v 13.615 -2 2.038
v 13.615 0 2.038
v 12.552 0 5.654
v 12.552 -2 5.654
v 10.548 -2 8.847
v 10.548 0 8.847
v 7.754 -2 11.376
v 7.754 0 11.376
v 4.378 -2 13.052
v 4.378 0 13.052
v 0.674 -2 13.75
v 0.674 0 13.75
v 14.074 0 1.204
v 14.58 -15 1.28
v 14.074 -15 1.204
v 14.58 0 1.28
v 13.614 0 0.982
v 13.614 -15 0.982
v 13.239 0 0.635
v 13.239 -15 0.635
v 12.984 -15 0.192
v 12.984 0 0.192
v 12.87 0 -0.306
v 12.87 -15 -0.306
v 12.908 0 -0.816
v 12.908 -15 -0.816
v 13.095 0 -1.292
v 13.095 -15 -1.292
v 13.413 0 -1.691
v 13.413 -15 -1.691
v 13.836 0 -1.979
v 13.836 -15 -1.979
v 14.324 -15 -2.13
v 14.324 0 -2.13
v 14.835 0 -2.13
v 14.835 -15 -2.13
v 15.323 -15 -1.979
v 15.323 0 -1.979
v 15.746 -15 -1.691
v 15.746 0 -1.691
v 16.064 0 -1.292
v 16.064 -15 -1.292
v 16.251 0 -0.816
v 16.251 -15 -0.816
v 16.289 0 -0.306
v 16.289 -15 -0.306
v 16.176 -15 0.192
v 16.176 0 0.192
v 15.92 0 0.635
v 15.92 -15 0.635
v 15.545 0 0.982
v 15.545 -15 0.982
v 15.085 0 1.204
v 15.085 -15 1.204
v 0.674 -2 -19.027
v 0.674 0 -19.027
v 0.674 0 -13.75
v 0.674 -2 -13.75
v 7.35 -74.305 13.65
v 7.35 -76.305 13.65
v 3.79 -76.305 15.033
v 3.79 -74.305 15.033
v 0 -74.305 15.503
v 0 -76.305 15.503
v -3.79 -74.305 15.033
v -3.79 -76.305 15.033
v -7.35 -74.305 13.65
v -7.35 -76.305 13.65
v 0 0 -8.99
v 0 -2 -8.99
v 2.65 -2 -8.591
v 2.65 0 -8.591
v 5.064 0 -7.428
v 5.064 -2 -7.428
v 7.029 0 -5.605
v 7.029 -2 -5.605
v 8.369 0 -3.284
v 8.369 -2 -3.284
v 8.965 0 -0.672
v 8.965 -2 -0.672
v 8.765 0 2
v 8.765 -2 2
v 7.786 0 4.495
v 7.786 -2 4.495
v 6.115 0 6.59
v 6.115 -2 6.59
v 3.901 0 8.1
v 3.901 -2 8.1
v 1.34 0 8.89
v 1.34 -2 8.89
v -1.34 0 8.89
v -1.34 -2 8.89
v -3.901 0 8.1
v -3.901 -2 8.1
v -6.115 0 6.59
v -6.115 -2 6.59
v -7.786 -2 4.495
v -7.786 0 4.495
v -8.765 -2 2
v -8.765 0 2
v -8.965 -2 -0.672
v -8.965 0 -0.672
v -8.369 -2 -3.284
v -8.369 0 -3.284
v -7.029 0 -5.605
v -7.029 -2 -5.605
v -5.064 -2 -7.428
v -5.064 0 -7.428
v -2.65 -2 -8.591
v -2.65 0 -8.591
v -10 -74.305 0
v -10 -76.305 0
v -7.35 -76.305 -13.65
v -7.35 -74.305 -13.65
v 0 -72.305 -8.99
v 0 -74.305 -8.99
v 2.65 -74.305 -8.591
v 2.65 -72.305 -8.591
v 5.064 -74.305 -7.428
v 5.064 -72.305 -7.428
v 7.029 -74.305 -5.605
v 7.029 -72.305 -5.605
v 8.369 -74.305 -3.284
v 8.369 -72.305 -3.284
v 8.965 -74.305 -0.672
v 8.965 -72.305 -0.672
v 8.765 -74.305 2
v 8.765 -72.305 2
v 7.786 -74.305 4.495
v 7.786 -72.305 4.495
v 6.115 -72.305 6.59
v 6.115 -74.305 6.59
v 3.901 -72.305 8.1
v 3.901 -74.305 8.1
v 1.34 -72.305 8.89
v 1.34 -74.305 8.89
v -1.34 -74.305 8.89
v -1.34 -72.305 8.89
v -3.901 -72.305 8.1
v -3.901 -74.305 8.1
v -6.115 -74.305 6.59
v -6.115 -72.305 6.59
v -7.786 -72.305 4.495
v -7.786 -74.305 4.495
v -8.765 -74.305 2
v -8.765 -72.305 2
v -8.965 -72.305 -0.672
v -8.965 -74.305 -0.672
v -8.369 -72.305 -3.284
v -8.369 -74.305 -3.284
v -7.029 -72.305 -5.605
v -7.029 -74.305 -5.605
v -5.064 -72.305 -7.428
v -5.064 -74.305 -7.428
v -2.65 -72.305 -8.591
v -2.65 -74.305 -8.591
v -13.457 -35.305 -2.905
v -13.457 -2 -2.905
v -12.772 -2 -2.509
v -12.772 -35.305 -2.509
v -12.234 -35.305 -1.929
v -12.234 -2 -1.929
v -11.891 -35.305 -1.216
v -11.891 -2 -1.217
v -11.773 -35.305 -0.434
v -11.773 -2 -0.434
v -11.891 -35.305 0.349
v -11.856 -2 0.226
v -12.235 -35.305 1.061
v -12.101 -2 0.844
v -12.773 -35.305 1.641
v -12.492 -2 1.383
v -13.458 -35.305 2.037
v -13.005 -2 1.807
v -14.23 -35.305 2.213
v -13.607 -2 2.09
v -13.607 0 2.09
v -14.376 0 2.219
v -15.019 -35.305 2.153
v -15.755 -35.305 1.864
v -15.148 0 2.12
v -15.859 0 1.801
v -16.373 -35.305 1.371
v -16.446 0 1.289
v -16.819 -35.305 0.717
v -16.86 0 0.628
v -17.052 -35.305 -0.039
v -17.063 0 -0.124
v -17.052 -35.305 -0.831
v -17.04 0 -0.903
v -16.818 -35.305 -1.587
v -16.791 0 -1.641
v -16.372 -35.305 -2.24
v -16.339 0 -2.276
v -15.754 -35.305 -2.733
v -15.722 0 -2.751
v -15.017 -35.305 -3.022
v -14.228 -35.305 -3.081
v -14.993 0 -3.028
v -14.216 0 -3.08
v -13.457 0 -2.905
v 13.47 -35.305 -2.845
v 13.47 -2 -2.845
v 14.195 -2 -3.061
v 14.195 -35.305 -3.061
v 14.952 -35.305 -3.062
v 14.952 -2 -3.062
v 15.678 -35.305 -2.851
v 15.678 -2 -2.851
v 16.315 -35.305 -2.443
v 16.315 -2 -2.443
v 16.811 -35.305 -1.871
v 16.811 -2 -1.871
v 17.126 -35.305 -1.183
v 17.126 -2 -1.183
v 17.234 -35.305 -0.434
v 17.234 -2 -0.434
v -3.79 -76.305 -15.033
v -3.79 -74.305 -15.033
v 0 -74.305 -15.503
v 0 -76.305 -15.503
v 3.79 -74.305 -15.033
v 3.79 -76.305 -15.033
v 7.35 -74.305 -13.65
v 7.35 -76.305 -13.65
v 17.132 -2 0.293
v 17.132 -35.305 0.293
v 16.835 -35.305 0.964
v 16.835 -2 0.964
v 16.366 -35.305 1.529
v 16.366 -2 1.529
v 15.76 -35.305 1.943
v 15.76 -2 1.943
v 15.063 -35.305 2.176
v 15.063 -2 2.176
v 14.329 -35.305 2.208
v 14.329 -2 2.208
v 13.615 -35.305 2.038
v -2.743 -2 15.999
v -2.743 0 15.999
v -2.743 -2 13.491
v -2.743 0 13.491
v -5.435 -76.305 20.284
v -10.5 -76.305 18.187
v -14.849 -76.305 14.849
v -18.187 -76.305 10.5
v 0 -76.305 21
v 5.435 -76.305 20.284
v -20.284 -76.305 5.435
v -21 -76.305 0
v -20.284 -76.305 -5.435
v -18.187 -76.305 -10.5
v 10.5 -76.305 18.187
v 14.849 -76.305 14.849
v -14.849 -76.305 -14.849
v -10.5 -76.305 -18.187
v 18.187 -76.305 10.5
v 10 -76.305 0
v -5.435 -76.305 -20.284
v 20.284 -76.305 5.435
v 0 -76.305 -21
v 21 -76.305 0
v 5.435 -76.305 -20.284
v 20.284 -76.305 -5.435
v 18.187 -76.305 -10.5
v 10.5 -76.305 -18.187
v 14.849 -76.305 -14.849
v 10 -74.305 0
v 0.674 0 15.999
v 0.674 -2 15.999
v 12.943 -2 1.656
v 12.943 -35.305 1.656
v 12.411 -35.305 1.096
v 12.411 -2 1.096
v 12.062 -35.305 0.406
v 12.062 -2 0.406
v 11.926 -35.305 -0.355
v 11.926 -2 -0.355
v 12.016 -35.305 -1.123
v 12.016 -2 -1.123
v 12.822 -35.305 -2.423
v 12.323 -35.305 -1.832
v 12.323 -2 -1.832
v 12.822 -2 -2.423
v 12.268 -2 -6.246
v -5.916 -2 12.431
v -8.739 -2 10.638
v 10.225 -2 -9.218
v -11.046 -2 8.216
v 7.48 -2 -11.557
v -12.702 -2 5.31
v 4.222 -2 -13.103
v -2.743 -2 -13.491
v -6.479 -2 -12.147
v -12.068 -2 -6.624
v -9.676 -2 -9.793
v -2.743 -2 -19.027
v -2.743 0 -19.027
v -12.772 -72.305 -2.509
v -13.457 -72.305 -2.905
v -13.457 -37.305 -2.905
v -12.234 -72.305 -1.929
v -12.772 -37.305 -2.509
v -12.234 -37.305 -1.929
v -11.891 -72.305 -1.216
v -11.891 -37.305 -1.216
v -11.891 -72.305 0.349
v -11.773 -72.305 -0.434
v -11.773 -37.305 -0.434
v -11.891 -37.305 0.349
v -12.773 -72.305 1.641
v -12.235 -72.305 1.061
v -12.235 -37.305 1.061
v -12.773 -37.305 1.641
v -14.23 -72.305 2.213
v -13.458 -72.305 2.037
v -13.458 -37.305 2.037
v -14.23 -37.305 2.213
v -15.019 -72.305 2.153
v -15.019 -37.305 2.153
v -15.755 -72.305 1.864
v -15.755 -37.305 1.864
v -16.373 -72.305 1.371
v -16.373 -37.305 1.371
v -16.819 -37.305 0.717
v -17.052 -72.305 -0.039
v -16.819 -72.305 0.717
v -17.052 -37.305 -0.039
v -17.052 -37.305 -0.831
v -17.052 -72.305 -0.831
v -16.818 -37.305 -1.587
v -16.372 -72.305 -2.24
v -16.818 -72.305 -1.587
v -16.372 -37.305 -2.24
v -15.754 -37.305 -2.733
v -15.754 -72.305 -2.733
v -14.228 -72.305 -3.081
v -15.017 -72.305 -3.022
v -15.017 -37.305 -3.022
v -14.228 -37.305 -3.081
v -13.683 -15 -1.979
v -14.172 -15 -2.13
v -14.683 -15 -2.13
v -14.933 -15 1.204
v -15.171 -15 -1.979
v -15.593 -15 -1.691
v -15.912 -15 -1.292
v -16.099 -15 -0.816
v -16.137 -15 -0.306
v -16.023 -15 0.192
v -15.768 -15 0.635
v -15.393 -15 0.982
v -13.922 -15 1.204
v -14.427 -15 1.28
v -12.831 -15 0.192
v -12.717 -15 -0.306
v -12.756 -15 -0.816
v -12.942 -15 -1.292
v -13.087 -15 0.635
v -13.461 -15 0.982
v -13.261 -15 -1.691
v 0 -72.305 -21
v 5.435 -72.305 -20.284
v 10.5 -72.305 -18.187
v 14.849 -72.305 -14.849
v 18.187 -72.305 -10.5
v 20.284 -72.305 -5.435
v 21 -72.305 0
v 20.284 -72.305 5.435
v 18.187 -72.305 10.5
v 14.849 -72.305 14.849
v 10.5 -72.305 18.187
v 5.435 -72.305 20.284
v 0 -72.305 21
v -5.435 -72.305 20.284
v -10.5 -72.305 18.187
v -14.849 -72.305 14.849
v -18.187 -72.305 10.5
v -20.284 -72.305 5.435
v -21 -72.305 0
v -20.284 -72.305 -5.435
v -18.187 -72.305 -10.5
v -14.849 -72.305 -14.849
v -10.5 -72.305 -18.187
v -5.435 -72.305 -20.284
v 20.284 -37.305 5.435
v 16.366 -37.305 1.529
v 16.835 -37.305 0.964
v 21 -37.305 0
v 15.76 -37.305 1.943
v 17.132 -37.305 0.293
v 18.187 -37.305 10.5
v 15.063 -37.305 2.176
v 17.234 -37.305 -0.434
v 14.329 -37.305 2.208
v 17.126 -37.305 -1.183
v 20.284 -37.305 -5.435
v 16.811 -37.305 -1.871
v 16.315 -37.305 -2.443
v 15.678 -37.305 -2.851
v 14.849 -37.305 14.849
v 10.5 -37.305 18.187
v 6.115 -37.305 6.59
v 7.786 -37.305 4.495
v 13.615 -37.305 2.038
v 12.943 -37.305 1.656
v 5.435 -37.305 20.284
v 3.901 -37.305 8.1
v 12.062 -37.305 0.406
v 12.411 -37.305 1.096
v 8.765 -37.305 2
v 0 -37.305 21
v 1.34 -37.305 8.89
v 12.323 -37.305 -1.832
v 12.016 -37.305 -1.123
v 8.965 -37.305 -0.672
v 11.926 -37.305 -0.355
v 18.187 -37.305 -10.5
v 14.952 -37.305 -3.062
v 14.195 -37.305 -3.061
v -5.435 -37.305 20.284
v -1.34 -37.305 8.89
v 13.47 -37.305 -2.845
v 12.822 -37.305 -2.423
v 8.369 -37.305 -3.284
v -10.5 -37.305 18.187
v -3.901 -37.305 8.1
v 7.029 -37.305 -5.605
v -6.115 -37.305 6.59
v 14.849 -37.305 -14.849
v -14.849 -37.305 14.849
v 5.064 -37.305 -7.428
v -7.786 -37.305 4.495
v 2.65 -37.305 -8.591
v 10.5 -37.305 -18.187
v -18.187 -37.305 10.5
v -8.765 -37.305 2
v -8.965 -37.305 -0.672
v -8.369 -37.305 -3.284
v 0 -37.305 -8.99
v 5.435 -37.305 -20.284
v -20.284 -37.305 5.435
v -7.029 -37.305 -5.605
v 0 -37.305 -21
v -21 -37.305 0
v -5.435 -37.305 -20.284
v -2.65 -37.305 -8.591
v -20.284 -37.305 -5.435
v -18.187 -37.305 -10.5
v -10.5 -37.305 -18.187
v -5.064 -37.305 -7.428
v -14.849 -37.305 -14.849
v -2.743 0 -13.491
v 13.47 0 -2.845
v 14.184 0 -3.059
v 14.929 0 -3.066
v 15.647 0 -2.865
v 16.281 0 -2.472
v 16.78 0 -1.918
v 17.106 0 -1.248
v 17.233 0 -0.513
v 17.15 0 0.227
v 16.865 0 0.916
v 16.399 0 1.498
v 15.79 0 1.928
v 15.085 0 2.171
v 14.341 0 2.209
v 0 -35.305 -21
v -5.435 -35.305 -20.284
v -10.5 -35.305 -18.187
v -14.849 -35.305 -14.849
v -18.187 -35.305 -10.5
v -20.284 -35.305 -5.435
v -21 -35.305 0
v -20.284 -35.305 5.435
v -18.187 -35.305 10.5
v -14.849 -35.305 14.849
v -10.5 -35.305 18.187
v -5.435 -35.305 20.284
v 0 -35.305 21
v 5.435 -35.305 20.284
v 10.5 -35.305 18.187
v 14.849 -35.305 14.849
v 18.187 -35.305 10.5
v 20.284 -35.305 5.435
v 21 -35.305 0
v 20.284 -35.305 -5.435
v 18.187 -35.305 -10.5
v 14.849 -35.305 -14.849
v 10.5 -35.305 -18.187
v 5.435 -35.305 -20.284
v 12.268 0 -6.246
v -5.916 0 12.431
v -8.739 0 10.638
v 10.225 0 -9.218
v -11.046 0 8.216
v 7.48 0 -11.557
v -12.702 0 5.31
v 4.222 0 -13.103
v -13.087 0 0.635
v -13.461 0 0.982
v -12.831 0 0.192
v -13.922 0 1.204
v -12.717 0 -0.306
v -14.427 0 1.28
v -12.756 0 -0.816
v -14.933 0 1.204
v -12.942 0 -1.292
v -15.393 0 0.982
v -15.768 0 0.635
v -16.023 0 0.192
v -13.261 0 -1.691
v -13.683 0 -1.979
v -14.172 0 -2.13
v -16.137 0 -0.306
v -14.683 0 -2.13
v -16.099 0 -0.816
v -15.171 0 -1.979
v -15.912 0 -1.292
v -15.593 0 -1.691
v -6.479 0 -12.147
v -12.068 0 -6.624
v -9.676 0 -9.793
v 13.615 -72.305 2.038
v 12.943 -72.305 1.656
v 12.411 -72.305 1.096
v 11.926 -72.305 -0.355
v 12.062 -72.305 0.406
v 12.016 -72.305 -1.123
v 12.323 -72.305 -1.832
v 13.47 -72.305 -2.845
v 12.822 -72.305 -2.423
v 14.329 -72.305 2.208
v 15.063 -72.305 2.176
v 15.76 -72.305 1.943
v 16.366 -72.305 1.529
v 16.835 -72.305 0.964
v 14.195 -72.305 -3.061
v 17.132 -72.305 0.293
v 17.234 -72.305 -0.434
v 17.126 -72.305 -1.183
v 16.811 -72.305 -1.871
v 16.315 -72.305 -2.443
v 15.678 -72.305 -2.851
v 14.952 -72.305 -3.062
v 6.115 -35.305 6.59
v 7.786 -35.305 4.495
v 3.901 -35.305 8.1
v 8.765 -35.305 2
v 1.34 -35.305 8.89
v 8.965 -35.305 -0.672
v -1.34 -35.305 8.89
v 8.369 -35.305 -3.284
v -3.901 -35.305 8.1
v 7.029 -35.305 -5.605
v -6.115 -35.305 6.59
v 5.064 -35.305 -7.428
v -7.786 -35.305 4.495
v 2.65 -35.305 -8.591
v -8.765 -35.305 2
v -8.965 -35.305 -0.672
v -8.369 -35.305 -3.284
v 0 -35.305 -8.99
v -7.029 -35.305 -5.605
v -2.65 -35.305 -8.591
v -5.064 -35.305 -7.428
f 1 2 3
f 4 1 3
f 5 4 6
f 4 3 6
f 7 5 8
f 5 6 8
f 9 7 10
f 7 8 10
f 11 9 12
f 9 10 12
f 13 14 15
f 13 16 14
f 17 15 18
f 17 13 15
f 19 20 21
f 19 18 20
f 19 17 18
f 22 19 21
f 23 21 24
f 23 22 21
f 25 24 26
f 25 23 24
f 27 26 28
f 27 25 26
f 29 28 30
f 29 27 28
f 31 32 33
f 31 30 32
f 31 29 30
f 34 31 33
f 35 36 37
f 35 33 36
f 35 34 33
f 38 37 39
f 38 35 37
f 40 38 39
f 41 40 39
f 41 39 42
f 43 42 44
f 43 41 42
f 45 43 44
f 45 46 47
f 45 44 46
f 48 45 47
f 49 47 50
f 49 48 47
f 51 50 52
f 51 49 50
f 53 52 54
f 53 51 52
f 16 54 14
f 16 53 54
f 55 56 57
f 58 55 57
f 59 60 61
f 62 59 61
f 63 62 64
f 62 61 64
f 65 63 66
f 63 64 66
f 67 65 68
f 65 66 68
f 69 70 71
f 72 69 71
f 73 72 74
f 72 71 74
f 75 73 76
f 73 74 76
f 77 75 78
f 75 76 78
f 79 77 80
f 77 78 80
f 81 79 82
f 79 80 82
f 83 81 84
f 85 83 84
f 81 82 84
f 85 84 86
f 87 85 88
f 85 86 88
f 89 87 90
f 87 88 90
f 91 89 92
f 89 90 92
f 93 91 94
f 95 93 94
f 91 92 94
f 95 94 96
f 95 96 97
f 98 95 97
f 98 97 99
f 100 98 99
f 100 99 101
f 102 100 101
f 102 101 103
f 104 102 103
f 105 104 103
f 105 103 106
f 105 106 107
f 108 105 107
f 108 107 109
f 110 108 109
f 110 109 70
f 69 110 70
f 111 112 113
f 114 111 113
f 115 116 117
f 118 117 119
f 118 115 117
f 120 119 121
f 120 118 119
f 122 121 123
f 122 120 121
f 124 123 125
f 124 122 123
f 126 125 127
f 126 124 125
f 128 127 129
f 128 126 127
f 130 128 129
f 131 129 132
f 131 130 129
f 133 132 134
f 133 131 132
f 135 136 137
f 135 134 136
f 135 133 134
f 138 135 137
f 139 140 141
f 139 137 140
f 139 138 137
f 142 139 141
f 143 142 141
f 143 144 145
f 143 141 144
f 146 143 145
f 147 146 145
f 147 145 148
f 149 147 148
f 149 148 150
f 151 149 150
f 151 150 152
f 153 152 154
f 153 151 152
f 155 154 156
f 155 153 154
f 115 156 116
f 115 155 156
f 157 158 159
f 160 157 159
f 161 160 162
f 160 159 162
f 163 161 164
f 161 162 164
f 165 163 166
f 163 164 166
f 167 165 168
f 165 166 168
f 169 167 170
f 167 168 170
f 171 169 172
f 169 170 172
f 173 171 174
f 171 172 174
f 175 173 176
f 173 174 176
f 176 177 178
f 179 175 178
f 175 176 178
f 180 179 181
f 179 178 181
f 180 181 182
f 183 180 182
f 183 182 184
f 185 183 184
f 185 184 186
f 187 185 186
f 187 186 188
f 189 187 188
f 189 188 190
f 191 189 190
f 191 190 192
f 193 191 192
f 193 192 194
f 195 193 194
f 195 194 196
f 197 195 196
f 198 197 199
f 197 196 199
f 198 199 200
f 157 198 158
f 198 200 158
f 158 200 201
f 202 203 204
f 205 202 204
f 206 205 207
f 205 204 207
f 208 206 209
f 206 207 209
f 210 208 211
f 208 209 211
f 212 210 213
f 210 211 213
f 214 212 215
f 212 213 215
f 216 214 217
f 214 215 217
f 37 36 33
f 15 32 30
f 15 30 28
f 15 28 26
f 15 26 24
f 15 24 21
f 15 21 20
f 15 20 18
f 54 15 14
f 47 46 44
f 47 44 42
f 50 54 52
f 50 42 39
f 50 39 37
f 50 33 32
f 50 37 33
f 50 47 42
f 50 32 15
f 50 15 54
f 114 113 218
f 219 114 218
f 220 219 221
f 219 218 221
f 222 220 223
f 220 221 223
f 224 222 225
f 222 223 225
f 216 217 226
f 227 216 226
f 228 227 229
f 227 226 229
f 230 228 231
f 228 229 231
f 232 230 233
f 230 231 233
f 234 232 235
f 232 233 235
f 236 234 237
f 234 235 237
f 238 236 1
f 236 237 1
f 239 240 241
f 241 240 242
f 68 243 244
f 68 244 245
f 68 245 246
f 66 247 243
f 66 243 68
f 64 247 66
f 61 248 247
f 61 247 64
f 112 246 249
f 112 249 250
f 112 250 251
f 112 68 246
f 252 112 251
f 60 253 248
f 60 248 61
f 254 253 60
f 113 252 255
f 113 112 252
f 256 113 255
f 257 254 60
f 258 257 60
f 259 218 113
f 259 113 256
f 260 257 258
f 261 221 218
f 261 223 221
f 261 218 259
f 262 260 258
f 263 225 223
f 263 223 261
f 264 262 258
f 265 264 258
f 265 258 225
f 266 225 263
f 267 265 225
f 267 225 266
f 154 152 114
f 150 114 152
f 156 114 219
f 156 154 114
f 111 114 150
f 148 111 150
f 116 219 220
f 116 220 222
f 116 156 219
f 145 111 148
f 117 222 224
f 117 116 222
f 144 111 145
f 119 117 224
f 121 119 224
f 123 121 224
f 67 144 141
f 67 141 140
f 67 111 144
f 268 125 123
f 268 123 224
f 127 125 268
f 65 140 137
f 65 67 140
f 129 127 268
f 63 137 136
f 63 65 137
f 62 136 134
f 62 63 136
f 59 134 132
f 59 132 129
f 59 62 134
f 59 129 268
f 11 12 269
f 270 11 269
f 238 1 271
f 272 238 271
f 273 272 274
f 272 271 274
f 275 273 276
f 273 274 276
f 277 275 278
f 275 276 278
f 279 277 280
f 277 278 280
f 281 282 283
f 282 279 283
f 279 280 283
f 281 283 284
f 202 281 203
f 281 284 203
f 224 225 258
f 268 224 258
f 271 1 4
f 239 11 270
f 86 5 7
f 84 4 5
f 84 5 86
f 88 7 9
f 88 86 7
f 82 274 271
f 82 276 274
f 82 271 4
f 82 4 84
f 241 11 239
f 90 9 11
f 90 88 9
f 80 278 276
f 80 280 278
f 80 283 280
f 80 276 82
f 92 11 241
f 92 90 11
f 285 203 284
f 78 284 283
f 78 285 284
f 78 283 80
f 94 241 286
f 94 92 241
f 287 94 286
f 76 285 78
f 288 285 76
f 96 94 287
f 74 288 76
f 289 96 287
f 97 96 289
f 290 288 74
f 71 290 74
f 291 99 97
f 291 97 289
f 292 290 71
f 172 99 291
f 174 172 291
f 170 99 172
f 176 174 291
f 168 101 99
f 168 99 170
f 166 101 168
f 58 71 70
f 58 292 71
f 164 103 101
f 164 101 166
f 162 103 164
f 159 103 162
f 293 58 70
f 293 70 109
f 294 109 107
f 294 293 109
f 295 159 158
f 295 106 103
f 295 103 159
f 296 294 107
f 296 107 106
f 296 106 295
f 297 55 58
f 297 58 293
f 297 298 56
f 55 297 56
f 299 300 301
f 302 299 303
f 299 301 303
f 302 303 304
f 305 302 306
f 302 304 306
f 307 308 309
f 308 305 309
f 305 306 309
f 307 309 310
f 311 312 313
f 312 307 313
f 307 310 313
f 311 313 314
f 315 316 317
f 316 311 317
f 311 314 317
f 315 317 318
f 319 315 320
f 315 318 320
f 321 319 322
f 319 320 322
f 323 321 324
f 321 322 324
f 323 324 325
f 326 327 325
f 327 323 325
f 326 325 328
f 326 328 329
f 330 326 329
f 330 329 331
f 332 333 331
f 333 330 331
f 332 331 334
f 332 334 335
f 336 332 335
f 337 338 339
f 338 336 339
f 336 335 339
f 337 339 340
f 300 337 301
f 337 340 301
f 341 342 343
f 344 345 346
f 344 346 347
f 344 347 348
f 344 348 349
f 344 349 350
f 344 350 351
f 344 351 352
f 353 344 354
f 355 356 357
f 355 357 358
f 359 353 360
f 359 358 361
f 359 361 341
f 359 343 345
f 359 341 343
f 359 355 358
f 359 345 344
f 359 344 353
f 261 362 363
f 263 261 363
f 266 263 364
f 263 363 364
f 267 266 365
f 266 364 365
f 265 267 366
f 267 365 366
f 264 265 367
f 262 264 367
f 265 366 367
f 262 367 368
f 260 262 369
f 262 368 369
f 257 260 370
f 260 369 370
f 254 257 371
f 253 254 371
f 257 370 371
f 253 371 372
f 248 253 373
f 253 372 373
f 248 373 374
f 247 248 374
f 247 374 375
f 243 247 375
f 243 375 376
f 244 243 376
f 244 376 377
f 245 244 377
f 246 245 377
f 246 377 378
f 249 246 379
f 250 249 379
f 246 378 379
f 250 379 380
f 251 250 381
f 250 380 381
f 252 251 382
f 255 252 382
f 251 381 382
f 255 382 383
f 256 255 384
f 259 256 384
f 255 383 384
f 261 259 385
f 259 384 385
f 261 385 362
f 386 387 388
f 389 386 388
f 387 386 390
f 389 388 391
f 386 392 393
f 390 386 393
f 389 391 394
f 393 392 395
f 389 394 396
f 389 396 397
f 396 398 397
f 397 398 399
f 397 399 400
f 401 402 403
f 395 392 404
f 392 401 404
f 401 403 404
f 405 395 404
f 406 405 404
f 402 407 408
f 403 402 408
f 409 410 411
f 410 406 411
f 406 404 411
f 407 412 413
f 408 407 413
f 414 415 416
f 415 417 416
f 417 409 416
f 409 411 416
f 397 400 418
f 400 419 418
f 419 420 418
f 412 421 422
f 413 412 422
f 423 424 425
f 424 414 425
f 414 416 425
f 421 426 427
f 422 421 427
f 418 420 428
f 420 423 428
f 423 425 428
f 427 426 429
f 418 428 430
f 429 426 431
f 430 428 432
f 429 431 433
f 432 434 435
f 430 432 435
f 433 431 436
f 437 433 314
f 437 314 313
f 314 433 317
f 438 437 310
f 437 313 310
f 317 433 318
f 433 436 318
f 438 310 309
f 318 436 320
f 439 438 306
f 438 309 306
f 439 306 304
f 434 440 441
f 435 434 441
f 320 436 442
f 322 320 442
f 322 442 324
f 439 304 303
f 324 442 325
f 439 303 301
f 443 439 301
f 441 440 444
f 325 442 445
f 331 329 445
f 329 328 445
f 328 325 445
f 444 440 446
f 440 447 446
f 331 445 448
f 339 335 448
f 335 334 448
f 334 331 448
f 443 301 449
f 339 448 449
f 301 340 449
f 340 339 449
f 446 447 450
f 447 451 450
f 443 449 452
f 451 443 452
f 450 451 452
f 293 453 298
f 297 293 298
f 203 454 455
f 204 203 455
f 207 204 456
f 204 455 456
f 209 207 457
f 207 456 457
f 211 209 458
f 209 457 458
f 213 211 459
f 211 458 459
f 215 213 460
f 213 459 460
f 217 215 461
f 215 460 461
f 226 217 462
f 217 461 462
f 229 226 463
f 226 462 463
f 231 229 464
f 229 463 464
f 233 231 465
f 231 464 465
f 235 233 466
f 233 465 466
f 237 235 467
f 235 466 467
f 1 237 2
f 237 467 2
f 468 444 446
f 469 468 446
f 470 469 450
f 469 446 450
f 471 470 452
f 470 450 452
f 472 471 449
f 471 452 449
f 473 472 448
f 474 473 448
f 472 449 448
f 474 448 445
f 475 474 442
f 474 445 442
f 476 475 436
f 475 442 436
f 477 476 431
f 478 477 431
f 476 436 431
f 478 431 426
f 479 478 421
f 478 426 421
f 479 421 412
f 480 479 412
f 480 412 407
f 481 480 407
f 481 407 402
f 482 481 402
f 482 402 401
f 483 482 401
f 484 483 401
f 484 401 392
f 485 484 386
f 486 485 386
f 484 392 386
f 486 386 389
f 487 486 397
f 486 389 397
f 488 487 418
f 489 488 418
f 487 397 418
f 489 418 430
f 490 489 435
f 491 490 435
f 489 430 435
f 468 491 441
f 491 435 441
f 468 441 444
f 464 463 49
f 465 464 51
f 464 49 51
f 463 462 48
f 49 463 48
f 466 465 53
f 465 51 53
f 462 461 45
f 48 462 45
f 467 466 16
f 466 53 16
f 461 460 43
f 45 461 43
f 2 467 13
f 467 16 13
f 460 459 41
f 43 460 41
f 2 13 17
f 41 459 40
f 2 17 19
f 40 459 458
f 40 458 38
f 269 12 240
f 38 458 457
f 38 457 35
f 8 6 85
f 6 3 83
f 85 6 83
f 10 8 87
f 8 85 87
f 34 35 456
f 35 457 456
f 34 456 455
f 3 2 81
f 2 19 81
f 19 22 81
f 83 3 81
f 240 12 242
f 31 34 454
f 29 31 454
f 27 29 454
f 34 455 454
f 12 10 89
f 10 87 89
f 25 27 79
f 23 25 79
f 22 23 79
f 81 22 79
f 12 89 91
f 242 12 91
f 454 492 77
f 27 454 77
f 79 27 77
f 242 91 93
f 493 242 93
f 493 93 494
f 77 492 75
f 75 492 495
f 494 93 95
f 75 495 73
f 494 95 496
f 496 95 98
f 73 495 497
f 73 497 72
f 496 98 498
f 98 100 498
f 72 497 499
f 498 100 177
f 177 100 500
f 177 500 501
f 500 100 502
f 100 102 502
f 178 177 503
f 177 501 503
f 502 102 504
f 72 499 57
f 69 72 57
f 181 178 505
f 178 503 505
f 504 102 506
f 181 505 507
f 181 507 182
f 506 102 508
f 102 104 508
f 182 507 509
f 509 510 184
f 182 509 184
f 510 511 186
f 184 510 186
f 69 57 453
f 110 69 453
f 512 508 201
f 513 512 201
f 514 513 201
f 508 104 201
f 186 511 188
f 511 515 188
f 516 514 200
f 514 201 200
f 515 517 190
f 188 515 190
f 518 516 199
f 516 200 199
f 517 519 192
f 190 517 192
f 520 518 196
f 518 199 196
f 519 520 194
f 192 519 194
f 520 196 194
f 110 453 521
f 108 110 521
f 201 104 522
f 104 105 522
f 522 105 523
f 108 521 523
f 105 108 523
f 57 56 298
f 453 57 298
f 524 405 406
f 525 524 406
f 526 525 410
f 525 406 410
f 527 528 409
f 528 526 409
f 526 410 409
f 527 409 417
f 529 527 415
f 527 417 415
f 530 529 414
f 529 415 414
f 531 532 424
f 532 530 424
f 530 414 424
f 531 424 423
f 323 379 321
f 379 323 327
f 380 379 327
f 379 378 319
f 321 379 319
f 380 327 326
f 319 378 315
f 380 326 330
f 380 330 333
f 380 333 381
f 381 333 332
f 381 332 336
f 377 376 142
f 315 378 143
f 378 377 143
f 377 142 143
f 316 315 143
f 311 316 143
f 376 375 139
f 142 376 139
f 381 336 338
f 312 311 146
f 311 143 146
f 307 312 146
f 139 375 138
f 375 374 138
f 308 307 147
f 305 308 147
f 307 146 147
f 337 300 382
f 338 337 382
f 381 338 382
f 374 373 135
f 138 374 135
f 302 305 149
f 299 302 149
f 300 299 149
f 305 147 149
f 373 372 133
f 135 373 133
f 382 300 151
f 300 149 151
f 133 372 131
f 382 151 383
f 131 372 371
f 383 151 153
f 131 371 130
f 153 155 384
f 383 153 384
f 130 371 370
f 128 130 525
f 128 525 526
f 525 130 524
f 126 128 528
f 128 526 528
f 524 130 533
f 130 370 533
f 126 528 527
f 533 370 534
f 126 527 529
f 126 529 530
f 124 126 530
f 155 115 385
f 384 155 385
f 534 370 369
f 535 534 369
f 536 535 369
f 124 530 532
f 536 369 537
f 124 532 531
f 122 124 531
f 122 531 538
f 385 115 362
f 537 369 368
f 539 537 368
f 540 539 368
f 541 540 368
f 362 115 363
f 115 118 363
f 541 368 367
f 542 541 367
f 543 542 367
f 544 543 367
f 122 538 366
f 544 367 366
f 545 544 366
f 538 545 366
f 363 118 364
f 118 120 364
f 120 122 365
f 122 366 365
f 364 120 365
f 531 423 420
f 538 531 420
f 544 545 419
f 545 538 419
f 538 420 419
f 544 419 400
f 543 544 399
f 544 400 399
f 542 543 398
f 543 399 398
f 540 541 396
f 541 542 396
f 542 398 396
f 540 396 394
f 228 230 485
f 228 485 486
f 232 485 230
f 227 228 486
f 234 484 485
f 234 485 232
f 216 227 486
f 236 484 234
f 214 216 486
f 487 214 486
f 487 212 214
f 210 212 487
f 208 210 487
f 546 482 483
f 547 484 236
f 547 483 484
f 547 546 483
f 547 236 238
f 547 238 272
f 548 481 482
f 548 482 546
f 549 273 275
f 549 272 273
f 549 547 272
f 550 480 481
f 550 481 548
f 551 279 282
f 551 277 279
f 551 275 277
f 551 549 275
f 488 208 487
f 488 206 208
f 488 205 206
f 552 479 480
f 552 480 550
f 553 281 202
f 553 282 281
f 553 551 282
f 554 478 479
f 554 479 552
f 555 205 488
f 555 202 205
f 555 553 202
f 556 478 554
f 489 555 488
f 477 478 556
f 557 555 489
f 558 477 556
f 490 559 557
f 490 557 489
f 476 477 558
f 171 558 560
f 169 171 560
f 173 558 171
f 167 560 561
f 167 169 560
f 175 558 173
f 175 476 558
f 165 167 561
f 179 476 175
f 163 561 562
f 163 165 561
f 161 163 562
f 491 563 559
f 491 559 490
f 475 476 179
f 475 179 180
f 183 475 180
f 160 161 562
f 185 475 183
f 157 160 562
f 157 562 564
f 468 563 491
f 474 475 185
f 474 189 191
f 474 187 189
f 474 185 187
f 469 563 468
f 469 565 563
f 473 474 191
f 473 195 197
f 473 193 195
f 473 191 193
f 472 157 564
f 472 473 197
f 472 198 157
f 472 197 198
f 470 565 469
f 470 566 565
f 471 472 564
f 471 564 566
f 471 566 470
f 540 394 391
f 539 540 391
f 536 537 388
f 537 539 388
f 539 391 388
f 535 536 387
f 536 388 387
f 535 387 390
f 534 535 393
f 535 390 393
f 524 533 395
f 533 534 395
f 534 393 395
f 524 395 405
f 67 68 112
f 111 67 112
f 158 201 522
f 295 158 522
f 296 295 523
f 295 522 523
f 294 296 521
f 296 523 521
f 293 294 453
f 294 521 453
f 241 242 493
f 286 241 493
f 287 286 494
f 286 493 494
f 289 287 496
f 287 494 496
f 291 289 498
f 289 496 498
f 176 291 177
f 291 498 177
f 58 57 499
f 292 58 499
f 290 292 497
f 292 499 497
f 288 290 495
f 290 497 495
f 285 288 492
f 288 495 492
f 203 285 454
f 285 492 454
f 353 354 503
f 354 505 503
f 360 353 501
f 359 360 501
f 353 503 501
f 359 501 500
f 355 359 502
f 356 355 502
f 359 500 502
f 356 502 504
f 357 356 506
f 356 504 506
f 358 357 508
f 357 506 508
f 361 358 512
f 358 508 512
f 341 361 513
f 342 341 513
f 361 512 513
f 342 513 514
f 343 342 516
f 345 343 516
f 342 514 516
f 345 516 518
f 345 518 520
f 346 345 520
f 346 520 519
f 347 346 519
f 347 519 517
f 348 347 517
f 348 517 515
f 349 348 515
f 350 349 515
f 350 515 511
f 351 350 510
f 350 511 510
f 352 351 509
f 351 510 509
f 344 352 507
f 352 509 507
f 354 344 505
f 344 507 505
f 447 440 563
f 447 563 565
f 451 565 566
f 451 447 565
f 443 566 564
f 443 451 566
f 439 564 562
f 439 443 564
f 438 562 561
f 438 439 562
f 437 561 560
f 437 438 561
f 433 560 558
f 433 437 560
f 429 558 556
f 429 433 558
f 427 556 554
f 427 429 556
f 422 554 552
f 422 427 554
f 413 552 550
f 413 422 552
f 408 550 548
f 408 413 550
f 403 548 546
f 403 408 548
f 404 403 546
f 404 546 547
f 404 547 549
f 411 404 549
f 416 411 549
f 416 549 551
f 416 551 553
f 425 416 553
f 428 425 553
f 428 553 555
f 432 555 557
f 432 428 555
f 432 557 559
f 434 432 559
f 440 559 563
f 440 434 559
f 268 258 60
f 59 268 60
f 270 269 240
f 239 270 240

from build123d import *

# Parameters (mm, degrees)
BOSS_EXTRUDE1_DEPTH      = 2
CUT_EXTRUDE1_REACH       = 27.75
SKETCH2_R                = 1.7145
SKETCH3_R                = 1.7145
BOSS_EXTRUDE2_DEPTH      = 72.305
CUT_EXTRUDE2_REACH       = 78.727
SKETCH4_R                = 8.99
BOSS_EXTRUDE3_DEPTH      = 2
BOSS_EXTRUDE3_DEPTH_BACK = 2
SKETCH5_R                = 21
SKETCH5_R_2              = 8.99
CUT_EXTRUDE3_DEPTH       = 2
SKETCH7_R                = 21
SKETCH7_R_2              = 8.99
BOSS_EXTRUDE4_DEPTH      = 2
SKETCH8_R                = 1.7145
BOSS_EXTRUDE5_DEPTH      = 57.305


with BuildPart() as part:
    # Sketch1 → Boss-Extrude1 (new body)
    with BuildSketch(Plane(origin=(0, 0, 0), x_dir=(1, 0, 0), z_dir=(0, 1, 0))):
        with BuildLine():
            Line((-2.743211684, 13.490721697), (-2.743211684, 19.02714))
            Line((-2.743211684, 19.02714), (0.674160958, 19.02714))
            Line((0.674160958, 19.02714), (0.674160958, 13.750283242))
            ThreePointArc((0.674160958, 13.750283242), (8.929745908, 10.47780608), (13.469544487, 2.845374062))
            ThreePointArc((13.469544487, 2.845374062), (17.232722938, 0.513379028), (13.615039655, -2.03849882))
            ThreePointArc((13.615039655, -2.03849882), (9.237791247, -10.207252084), (0.674160958, -13.750283242))
            Line((0.674160958, -13.750283242), (0.674160958, -15.99946))
            Line((0.674160958, -15.99946), (-2.743211684, -15.99946))
            Line((-2.743211684, -15.99946), (-2.743211684, -13.490721697))
            ThreePointArc((-2.743211684, -13.490721697), (-9.966316815, -9.49722651), (-13.607209812, -2.090125207))
            ThreePointArc((-13.607209812, -2.090125207), (-17.080297956, 0.514213195), (-13.456831252, 2.904905316))
            ThreePointArc((-13.456831252, 2.904905316), (-9.676012861, 9.792831937), (-2.743211684, 13.490721697))
        make_face()
    extrude(amount=-BOSS_EXTRUDE1_DEPTH)

    # Sketch2 → Cut-Extrude1 (cut, up to next)
    with BuildSketch(Plane(origin=(0, 0, 0), x_dir=(1, 0, 0), z_dir=(0, 1, 0)), mode=Mode.PRIVATE) as cut_extrude1_sk1:
        with Locations(Location((14.5796, 0.43434, 0), (0, 0, 270))):
            Circle(SKETCH2_R)
    cut_extrude1_tool1 = extrude(cut_extrude1_sk1.sketch, amount=-CUT_EXTRUDE1_REACH, mode=Mode.PRIVATE) & part.part
    # Sketch2 → Cut-Extrude1 (cut, up to next)
    with BuildSketch(Plane(origin=(0, 0, 0), x_dir=(1, 0, 0), z_dir=(0, 1, 0)), mode=Mode.PRIVATE) as cut_extrude1_sk2:
        with Locations(Location((-14.4272, 0.43434, 0), (0, 0, 270))):
            Circle(SKETCH2_R)
    cut_extrude1_tool2 = extrude(cut_extrude1_sk2.sketch, amount=-CUT_EXTRUDE1_REACH, mode=Mode.PRIVATE) & part.part
    add(cut_extrude1_tool1.solids().sort_by_distance((14.5796, 0, -0.43434))[0], mode=Mode.SUBTRACT)
    add(cut_extrude1_tool2.solids().sort_by_distance((-14.4272, 0, -0.43434))[0], mode=Mode.SUBTRACT)

    # Sketch3 → Boss-Extrude2 (add)
    # profile 1 of 2: a face of its own
    with BuildSketch(Plane.XZ.offset(2)):
        with BuildLine():
            ThreePointArc((13.469544487, -2.845374062), (16.011187954, -2.669483042), (17.2339, -0.43434))
            ThreePointArc((17.2339, -0.43434), (16.077110595, 1.757182418), (13.615039655, 2.03849882))
            ThreePointArc((13.615039655, 2.03849882), (11.926477062, -0.355300972), (13.469544487, -2.845374062))
        make_face()
        with Locations(Location((14.5796, -0.43434, 0), (0, 0, 90))):
            Circle(SKETCH3_R, mode=Mode.SUBTRACT)
    # profile 2 of 2: a face of its own
    with BuildSketch(Plane.XZ.offset(2)):
        with BuildLine():
            ThreePointArc((-13.456831252, -2.904905316), (-12.233919551, -1.929274567), (-11.7729, -0.43434))
            ThreePointArc((-11.7729, -0.43434), (-12.279898386, 1.125917756), (-13.607209812, 2.090125207))
            ThreePointArc((-13.607209812, 2.090125207), (-17.080297956, -0.514213195), (-13.456831252, -2.904905316))
        make_face()
        with Locations(Location((-14.4272, -0.43434, 0), (0, 0, 90))):
            Circle(SKETCH3_R, mode=Mode.SUBTRACT)
    extrude(amount=BOSS_EXTRUDE2_DEPTH)

    # Sketch4 → Cut-Extrude2 (cut, up to next)
    with BuildSketch(Plane.XZ.offset(2), mode=Mode.PRIVATE) as cut_extrude2_sk1:
        with Locations(Location((0, 0, 0), (0, 0, 270))):
            Circle(SKETCH4_R)
    cut_extrude2_tool1 = extrude(cut_extrude2_sk1.sketch, amount=-CUT_EXTRUDE2_REACH, mode=Mode.PRIVATE) & part.part
    add(cut_extrude2_tool1.solids().sort_by_distance((0, -2, 0))[0], mode=Mode.SUBTRACT)

    # Sketch5 → Boss-Extrude3 (add, two sides: drawn at the far end of the back side and taken through both)
    with BuildSketch(Plane.XZ.offset(74.305).offset(-BOSS_EXTRUDE3_DEPTH_BACK)):
        with Locations(Location((0, 0, 0), (0, 0, 270))):
            Circle(SKETCH5_R)
        with Locations(Location((0, 0, 0), (0, 0, 270))):
            Circle(SKETCH5_R_2, mode=Mode.SUBTRACT)
    extrude(amount=BOSS_EXTRUDE3_DEPTH + BOSS_EXTRUDE3_DEPTH_BACK)

    # Sketch6 → Cut-Extrude3 (cut)
    with BuildSketch(Plane.XZ.offset(76.305)):
        with BuildLine():
            Line((-7.35, 13.65), (-10, 0))
            Line((-10, 0), (-7.35, -13.65))
            ThreePointArc((-7.35, -13.65), (0, -15.503480297), (7.35, -13.65))
            Line((7.35, -13.65), (10, 0))
            Line((10, 0), (7.35, 13.65))
            ThreePointArc((7.35, 13.65), (0, 15.503480297), (-7.35, 13.65))
        make_face()
    extrude(amount=-CUT_EXTRUDE3_DEPTH, mode=Mode.SUBTRACT)

    # Sketch7 → Boss-Extrude4 (add)
    with BuildSketch(Plane(origin=(0, -37.305, 0), x_dir=(1, 0, 0), z_dir=(0, 1, 0))):
        with Locations(Location((0, 0, 0), (0, 0, 90))):
            Circle(SKETCH7_R)
        with Locations(Location((0, 0, 0), (0, 0, 90))):
            Circle(SKETCH7_R_2, mode=Mode.SUBTRACT)
    extrude(amount=BOSS_EXTRUDE4_DEPTH)

    # Sketch8 → Boss-Extrude5 (add)
    with BuildSketch(Plane(origin=(0, -72.305, 0), x_dir=(1, 0, 0), z_dir=(0, 1, 0))):
        with Locations(Location((-14.4272, 0.43434, 0), (0, 0, 270))):
            Circle(SKETCH8_R)
        with Locations(Location((14.5796, 0.43434, 0), (0, 0, 270))):
            Circle(SKETCH8_R)
    extrude(amount=BOSS_EXTRUDE5_DEPTH)


solid = part.part
